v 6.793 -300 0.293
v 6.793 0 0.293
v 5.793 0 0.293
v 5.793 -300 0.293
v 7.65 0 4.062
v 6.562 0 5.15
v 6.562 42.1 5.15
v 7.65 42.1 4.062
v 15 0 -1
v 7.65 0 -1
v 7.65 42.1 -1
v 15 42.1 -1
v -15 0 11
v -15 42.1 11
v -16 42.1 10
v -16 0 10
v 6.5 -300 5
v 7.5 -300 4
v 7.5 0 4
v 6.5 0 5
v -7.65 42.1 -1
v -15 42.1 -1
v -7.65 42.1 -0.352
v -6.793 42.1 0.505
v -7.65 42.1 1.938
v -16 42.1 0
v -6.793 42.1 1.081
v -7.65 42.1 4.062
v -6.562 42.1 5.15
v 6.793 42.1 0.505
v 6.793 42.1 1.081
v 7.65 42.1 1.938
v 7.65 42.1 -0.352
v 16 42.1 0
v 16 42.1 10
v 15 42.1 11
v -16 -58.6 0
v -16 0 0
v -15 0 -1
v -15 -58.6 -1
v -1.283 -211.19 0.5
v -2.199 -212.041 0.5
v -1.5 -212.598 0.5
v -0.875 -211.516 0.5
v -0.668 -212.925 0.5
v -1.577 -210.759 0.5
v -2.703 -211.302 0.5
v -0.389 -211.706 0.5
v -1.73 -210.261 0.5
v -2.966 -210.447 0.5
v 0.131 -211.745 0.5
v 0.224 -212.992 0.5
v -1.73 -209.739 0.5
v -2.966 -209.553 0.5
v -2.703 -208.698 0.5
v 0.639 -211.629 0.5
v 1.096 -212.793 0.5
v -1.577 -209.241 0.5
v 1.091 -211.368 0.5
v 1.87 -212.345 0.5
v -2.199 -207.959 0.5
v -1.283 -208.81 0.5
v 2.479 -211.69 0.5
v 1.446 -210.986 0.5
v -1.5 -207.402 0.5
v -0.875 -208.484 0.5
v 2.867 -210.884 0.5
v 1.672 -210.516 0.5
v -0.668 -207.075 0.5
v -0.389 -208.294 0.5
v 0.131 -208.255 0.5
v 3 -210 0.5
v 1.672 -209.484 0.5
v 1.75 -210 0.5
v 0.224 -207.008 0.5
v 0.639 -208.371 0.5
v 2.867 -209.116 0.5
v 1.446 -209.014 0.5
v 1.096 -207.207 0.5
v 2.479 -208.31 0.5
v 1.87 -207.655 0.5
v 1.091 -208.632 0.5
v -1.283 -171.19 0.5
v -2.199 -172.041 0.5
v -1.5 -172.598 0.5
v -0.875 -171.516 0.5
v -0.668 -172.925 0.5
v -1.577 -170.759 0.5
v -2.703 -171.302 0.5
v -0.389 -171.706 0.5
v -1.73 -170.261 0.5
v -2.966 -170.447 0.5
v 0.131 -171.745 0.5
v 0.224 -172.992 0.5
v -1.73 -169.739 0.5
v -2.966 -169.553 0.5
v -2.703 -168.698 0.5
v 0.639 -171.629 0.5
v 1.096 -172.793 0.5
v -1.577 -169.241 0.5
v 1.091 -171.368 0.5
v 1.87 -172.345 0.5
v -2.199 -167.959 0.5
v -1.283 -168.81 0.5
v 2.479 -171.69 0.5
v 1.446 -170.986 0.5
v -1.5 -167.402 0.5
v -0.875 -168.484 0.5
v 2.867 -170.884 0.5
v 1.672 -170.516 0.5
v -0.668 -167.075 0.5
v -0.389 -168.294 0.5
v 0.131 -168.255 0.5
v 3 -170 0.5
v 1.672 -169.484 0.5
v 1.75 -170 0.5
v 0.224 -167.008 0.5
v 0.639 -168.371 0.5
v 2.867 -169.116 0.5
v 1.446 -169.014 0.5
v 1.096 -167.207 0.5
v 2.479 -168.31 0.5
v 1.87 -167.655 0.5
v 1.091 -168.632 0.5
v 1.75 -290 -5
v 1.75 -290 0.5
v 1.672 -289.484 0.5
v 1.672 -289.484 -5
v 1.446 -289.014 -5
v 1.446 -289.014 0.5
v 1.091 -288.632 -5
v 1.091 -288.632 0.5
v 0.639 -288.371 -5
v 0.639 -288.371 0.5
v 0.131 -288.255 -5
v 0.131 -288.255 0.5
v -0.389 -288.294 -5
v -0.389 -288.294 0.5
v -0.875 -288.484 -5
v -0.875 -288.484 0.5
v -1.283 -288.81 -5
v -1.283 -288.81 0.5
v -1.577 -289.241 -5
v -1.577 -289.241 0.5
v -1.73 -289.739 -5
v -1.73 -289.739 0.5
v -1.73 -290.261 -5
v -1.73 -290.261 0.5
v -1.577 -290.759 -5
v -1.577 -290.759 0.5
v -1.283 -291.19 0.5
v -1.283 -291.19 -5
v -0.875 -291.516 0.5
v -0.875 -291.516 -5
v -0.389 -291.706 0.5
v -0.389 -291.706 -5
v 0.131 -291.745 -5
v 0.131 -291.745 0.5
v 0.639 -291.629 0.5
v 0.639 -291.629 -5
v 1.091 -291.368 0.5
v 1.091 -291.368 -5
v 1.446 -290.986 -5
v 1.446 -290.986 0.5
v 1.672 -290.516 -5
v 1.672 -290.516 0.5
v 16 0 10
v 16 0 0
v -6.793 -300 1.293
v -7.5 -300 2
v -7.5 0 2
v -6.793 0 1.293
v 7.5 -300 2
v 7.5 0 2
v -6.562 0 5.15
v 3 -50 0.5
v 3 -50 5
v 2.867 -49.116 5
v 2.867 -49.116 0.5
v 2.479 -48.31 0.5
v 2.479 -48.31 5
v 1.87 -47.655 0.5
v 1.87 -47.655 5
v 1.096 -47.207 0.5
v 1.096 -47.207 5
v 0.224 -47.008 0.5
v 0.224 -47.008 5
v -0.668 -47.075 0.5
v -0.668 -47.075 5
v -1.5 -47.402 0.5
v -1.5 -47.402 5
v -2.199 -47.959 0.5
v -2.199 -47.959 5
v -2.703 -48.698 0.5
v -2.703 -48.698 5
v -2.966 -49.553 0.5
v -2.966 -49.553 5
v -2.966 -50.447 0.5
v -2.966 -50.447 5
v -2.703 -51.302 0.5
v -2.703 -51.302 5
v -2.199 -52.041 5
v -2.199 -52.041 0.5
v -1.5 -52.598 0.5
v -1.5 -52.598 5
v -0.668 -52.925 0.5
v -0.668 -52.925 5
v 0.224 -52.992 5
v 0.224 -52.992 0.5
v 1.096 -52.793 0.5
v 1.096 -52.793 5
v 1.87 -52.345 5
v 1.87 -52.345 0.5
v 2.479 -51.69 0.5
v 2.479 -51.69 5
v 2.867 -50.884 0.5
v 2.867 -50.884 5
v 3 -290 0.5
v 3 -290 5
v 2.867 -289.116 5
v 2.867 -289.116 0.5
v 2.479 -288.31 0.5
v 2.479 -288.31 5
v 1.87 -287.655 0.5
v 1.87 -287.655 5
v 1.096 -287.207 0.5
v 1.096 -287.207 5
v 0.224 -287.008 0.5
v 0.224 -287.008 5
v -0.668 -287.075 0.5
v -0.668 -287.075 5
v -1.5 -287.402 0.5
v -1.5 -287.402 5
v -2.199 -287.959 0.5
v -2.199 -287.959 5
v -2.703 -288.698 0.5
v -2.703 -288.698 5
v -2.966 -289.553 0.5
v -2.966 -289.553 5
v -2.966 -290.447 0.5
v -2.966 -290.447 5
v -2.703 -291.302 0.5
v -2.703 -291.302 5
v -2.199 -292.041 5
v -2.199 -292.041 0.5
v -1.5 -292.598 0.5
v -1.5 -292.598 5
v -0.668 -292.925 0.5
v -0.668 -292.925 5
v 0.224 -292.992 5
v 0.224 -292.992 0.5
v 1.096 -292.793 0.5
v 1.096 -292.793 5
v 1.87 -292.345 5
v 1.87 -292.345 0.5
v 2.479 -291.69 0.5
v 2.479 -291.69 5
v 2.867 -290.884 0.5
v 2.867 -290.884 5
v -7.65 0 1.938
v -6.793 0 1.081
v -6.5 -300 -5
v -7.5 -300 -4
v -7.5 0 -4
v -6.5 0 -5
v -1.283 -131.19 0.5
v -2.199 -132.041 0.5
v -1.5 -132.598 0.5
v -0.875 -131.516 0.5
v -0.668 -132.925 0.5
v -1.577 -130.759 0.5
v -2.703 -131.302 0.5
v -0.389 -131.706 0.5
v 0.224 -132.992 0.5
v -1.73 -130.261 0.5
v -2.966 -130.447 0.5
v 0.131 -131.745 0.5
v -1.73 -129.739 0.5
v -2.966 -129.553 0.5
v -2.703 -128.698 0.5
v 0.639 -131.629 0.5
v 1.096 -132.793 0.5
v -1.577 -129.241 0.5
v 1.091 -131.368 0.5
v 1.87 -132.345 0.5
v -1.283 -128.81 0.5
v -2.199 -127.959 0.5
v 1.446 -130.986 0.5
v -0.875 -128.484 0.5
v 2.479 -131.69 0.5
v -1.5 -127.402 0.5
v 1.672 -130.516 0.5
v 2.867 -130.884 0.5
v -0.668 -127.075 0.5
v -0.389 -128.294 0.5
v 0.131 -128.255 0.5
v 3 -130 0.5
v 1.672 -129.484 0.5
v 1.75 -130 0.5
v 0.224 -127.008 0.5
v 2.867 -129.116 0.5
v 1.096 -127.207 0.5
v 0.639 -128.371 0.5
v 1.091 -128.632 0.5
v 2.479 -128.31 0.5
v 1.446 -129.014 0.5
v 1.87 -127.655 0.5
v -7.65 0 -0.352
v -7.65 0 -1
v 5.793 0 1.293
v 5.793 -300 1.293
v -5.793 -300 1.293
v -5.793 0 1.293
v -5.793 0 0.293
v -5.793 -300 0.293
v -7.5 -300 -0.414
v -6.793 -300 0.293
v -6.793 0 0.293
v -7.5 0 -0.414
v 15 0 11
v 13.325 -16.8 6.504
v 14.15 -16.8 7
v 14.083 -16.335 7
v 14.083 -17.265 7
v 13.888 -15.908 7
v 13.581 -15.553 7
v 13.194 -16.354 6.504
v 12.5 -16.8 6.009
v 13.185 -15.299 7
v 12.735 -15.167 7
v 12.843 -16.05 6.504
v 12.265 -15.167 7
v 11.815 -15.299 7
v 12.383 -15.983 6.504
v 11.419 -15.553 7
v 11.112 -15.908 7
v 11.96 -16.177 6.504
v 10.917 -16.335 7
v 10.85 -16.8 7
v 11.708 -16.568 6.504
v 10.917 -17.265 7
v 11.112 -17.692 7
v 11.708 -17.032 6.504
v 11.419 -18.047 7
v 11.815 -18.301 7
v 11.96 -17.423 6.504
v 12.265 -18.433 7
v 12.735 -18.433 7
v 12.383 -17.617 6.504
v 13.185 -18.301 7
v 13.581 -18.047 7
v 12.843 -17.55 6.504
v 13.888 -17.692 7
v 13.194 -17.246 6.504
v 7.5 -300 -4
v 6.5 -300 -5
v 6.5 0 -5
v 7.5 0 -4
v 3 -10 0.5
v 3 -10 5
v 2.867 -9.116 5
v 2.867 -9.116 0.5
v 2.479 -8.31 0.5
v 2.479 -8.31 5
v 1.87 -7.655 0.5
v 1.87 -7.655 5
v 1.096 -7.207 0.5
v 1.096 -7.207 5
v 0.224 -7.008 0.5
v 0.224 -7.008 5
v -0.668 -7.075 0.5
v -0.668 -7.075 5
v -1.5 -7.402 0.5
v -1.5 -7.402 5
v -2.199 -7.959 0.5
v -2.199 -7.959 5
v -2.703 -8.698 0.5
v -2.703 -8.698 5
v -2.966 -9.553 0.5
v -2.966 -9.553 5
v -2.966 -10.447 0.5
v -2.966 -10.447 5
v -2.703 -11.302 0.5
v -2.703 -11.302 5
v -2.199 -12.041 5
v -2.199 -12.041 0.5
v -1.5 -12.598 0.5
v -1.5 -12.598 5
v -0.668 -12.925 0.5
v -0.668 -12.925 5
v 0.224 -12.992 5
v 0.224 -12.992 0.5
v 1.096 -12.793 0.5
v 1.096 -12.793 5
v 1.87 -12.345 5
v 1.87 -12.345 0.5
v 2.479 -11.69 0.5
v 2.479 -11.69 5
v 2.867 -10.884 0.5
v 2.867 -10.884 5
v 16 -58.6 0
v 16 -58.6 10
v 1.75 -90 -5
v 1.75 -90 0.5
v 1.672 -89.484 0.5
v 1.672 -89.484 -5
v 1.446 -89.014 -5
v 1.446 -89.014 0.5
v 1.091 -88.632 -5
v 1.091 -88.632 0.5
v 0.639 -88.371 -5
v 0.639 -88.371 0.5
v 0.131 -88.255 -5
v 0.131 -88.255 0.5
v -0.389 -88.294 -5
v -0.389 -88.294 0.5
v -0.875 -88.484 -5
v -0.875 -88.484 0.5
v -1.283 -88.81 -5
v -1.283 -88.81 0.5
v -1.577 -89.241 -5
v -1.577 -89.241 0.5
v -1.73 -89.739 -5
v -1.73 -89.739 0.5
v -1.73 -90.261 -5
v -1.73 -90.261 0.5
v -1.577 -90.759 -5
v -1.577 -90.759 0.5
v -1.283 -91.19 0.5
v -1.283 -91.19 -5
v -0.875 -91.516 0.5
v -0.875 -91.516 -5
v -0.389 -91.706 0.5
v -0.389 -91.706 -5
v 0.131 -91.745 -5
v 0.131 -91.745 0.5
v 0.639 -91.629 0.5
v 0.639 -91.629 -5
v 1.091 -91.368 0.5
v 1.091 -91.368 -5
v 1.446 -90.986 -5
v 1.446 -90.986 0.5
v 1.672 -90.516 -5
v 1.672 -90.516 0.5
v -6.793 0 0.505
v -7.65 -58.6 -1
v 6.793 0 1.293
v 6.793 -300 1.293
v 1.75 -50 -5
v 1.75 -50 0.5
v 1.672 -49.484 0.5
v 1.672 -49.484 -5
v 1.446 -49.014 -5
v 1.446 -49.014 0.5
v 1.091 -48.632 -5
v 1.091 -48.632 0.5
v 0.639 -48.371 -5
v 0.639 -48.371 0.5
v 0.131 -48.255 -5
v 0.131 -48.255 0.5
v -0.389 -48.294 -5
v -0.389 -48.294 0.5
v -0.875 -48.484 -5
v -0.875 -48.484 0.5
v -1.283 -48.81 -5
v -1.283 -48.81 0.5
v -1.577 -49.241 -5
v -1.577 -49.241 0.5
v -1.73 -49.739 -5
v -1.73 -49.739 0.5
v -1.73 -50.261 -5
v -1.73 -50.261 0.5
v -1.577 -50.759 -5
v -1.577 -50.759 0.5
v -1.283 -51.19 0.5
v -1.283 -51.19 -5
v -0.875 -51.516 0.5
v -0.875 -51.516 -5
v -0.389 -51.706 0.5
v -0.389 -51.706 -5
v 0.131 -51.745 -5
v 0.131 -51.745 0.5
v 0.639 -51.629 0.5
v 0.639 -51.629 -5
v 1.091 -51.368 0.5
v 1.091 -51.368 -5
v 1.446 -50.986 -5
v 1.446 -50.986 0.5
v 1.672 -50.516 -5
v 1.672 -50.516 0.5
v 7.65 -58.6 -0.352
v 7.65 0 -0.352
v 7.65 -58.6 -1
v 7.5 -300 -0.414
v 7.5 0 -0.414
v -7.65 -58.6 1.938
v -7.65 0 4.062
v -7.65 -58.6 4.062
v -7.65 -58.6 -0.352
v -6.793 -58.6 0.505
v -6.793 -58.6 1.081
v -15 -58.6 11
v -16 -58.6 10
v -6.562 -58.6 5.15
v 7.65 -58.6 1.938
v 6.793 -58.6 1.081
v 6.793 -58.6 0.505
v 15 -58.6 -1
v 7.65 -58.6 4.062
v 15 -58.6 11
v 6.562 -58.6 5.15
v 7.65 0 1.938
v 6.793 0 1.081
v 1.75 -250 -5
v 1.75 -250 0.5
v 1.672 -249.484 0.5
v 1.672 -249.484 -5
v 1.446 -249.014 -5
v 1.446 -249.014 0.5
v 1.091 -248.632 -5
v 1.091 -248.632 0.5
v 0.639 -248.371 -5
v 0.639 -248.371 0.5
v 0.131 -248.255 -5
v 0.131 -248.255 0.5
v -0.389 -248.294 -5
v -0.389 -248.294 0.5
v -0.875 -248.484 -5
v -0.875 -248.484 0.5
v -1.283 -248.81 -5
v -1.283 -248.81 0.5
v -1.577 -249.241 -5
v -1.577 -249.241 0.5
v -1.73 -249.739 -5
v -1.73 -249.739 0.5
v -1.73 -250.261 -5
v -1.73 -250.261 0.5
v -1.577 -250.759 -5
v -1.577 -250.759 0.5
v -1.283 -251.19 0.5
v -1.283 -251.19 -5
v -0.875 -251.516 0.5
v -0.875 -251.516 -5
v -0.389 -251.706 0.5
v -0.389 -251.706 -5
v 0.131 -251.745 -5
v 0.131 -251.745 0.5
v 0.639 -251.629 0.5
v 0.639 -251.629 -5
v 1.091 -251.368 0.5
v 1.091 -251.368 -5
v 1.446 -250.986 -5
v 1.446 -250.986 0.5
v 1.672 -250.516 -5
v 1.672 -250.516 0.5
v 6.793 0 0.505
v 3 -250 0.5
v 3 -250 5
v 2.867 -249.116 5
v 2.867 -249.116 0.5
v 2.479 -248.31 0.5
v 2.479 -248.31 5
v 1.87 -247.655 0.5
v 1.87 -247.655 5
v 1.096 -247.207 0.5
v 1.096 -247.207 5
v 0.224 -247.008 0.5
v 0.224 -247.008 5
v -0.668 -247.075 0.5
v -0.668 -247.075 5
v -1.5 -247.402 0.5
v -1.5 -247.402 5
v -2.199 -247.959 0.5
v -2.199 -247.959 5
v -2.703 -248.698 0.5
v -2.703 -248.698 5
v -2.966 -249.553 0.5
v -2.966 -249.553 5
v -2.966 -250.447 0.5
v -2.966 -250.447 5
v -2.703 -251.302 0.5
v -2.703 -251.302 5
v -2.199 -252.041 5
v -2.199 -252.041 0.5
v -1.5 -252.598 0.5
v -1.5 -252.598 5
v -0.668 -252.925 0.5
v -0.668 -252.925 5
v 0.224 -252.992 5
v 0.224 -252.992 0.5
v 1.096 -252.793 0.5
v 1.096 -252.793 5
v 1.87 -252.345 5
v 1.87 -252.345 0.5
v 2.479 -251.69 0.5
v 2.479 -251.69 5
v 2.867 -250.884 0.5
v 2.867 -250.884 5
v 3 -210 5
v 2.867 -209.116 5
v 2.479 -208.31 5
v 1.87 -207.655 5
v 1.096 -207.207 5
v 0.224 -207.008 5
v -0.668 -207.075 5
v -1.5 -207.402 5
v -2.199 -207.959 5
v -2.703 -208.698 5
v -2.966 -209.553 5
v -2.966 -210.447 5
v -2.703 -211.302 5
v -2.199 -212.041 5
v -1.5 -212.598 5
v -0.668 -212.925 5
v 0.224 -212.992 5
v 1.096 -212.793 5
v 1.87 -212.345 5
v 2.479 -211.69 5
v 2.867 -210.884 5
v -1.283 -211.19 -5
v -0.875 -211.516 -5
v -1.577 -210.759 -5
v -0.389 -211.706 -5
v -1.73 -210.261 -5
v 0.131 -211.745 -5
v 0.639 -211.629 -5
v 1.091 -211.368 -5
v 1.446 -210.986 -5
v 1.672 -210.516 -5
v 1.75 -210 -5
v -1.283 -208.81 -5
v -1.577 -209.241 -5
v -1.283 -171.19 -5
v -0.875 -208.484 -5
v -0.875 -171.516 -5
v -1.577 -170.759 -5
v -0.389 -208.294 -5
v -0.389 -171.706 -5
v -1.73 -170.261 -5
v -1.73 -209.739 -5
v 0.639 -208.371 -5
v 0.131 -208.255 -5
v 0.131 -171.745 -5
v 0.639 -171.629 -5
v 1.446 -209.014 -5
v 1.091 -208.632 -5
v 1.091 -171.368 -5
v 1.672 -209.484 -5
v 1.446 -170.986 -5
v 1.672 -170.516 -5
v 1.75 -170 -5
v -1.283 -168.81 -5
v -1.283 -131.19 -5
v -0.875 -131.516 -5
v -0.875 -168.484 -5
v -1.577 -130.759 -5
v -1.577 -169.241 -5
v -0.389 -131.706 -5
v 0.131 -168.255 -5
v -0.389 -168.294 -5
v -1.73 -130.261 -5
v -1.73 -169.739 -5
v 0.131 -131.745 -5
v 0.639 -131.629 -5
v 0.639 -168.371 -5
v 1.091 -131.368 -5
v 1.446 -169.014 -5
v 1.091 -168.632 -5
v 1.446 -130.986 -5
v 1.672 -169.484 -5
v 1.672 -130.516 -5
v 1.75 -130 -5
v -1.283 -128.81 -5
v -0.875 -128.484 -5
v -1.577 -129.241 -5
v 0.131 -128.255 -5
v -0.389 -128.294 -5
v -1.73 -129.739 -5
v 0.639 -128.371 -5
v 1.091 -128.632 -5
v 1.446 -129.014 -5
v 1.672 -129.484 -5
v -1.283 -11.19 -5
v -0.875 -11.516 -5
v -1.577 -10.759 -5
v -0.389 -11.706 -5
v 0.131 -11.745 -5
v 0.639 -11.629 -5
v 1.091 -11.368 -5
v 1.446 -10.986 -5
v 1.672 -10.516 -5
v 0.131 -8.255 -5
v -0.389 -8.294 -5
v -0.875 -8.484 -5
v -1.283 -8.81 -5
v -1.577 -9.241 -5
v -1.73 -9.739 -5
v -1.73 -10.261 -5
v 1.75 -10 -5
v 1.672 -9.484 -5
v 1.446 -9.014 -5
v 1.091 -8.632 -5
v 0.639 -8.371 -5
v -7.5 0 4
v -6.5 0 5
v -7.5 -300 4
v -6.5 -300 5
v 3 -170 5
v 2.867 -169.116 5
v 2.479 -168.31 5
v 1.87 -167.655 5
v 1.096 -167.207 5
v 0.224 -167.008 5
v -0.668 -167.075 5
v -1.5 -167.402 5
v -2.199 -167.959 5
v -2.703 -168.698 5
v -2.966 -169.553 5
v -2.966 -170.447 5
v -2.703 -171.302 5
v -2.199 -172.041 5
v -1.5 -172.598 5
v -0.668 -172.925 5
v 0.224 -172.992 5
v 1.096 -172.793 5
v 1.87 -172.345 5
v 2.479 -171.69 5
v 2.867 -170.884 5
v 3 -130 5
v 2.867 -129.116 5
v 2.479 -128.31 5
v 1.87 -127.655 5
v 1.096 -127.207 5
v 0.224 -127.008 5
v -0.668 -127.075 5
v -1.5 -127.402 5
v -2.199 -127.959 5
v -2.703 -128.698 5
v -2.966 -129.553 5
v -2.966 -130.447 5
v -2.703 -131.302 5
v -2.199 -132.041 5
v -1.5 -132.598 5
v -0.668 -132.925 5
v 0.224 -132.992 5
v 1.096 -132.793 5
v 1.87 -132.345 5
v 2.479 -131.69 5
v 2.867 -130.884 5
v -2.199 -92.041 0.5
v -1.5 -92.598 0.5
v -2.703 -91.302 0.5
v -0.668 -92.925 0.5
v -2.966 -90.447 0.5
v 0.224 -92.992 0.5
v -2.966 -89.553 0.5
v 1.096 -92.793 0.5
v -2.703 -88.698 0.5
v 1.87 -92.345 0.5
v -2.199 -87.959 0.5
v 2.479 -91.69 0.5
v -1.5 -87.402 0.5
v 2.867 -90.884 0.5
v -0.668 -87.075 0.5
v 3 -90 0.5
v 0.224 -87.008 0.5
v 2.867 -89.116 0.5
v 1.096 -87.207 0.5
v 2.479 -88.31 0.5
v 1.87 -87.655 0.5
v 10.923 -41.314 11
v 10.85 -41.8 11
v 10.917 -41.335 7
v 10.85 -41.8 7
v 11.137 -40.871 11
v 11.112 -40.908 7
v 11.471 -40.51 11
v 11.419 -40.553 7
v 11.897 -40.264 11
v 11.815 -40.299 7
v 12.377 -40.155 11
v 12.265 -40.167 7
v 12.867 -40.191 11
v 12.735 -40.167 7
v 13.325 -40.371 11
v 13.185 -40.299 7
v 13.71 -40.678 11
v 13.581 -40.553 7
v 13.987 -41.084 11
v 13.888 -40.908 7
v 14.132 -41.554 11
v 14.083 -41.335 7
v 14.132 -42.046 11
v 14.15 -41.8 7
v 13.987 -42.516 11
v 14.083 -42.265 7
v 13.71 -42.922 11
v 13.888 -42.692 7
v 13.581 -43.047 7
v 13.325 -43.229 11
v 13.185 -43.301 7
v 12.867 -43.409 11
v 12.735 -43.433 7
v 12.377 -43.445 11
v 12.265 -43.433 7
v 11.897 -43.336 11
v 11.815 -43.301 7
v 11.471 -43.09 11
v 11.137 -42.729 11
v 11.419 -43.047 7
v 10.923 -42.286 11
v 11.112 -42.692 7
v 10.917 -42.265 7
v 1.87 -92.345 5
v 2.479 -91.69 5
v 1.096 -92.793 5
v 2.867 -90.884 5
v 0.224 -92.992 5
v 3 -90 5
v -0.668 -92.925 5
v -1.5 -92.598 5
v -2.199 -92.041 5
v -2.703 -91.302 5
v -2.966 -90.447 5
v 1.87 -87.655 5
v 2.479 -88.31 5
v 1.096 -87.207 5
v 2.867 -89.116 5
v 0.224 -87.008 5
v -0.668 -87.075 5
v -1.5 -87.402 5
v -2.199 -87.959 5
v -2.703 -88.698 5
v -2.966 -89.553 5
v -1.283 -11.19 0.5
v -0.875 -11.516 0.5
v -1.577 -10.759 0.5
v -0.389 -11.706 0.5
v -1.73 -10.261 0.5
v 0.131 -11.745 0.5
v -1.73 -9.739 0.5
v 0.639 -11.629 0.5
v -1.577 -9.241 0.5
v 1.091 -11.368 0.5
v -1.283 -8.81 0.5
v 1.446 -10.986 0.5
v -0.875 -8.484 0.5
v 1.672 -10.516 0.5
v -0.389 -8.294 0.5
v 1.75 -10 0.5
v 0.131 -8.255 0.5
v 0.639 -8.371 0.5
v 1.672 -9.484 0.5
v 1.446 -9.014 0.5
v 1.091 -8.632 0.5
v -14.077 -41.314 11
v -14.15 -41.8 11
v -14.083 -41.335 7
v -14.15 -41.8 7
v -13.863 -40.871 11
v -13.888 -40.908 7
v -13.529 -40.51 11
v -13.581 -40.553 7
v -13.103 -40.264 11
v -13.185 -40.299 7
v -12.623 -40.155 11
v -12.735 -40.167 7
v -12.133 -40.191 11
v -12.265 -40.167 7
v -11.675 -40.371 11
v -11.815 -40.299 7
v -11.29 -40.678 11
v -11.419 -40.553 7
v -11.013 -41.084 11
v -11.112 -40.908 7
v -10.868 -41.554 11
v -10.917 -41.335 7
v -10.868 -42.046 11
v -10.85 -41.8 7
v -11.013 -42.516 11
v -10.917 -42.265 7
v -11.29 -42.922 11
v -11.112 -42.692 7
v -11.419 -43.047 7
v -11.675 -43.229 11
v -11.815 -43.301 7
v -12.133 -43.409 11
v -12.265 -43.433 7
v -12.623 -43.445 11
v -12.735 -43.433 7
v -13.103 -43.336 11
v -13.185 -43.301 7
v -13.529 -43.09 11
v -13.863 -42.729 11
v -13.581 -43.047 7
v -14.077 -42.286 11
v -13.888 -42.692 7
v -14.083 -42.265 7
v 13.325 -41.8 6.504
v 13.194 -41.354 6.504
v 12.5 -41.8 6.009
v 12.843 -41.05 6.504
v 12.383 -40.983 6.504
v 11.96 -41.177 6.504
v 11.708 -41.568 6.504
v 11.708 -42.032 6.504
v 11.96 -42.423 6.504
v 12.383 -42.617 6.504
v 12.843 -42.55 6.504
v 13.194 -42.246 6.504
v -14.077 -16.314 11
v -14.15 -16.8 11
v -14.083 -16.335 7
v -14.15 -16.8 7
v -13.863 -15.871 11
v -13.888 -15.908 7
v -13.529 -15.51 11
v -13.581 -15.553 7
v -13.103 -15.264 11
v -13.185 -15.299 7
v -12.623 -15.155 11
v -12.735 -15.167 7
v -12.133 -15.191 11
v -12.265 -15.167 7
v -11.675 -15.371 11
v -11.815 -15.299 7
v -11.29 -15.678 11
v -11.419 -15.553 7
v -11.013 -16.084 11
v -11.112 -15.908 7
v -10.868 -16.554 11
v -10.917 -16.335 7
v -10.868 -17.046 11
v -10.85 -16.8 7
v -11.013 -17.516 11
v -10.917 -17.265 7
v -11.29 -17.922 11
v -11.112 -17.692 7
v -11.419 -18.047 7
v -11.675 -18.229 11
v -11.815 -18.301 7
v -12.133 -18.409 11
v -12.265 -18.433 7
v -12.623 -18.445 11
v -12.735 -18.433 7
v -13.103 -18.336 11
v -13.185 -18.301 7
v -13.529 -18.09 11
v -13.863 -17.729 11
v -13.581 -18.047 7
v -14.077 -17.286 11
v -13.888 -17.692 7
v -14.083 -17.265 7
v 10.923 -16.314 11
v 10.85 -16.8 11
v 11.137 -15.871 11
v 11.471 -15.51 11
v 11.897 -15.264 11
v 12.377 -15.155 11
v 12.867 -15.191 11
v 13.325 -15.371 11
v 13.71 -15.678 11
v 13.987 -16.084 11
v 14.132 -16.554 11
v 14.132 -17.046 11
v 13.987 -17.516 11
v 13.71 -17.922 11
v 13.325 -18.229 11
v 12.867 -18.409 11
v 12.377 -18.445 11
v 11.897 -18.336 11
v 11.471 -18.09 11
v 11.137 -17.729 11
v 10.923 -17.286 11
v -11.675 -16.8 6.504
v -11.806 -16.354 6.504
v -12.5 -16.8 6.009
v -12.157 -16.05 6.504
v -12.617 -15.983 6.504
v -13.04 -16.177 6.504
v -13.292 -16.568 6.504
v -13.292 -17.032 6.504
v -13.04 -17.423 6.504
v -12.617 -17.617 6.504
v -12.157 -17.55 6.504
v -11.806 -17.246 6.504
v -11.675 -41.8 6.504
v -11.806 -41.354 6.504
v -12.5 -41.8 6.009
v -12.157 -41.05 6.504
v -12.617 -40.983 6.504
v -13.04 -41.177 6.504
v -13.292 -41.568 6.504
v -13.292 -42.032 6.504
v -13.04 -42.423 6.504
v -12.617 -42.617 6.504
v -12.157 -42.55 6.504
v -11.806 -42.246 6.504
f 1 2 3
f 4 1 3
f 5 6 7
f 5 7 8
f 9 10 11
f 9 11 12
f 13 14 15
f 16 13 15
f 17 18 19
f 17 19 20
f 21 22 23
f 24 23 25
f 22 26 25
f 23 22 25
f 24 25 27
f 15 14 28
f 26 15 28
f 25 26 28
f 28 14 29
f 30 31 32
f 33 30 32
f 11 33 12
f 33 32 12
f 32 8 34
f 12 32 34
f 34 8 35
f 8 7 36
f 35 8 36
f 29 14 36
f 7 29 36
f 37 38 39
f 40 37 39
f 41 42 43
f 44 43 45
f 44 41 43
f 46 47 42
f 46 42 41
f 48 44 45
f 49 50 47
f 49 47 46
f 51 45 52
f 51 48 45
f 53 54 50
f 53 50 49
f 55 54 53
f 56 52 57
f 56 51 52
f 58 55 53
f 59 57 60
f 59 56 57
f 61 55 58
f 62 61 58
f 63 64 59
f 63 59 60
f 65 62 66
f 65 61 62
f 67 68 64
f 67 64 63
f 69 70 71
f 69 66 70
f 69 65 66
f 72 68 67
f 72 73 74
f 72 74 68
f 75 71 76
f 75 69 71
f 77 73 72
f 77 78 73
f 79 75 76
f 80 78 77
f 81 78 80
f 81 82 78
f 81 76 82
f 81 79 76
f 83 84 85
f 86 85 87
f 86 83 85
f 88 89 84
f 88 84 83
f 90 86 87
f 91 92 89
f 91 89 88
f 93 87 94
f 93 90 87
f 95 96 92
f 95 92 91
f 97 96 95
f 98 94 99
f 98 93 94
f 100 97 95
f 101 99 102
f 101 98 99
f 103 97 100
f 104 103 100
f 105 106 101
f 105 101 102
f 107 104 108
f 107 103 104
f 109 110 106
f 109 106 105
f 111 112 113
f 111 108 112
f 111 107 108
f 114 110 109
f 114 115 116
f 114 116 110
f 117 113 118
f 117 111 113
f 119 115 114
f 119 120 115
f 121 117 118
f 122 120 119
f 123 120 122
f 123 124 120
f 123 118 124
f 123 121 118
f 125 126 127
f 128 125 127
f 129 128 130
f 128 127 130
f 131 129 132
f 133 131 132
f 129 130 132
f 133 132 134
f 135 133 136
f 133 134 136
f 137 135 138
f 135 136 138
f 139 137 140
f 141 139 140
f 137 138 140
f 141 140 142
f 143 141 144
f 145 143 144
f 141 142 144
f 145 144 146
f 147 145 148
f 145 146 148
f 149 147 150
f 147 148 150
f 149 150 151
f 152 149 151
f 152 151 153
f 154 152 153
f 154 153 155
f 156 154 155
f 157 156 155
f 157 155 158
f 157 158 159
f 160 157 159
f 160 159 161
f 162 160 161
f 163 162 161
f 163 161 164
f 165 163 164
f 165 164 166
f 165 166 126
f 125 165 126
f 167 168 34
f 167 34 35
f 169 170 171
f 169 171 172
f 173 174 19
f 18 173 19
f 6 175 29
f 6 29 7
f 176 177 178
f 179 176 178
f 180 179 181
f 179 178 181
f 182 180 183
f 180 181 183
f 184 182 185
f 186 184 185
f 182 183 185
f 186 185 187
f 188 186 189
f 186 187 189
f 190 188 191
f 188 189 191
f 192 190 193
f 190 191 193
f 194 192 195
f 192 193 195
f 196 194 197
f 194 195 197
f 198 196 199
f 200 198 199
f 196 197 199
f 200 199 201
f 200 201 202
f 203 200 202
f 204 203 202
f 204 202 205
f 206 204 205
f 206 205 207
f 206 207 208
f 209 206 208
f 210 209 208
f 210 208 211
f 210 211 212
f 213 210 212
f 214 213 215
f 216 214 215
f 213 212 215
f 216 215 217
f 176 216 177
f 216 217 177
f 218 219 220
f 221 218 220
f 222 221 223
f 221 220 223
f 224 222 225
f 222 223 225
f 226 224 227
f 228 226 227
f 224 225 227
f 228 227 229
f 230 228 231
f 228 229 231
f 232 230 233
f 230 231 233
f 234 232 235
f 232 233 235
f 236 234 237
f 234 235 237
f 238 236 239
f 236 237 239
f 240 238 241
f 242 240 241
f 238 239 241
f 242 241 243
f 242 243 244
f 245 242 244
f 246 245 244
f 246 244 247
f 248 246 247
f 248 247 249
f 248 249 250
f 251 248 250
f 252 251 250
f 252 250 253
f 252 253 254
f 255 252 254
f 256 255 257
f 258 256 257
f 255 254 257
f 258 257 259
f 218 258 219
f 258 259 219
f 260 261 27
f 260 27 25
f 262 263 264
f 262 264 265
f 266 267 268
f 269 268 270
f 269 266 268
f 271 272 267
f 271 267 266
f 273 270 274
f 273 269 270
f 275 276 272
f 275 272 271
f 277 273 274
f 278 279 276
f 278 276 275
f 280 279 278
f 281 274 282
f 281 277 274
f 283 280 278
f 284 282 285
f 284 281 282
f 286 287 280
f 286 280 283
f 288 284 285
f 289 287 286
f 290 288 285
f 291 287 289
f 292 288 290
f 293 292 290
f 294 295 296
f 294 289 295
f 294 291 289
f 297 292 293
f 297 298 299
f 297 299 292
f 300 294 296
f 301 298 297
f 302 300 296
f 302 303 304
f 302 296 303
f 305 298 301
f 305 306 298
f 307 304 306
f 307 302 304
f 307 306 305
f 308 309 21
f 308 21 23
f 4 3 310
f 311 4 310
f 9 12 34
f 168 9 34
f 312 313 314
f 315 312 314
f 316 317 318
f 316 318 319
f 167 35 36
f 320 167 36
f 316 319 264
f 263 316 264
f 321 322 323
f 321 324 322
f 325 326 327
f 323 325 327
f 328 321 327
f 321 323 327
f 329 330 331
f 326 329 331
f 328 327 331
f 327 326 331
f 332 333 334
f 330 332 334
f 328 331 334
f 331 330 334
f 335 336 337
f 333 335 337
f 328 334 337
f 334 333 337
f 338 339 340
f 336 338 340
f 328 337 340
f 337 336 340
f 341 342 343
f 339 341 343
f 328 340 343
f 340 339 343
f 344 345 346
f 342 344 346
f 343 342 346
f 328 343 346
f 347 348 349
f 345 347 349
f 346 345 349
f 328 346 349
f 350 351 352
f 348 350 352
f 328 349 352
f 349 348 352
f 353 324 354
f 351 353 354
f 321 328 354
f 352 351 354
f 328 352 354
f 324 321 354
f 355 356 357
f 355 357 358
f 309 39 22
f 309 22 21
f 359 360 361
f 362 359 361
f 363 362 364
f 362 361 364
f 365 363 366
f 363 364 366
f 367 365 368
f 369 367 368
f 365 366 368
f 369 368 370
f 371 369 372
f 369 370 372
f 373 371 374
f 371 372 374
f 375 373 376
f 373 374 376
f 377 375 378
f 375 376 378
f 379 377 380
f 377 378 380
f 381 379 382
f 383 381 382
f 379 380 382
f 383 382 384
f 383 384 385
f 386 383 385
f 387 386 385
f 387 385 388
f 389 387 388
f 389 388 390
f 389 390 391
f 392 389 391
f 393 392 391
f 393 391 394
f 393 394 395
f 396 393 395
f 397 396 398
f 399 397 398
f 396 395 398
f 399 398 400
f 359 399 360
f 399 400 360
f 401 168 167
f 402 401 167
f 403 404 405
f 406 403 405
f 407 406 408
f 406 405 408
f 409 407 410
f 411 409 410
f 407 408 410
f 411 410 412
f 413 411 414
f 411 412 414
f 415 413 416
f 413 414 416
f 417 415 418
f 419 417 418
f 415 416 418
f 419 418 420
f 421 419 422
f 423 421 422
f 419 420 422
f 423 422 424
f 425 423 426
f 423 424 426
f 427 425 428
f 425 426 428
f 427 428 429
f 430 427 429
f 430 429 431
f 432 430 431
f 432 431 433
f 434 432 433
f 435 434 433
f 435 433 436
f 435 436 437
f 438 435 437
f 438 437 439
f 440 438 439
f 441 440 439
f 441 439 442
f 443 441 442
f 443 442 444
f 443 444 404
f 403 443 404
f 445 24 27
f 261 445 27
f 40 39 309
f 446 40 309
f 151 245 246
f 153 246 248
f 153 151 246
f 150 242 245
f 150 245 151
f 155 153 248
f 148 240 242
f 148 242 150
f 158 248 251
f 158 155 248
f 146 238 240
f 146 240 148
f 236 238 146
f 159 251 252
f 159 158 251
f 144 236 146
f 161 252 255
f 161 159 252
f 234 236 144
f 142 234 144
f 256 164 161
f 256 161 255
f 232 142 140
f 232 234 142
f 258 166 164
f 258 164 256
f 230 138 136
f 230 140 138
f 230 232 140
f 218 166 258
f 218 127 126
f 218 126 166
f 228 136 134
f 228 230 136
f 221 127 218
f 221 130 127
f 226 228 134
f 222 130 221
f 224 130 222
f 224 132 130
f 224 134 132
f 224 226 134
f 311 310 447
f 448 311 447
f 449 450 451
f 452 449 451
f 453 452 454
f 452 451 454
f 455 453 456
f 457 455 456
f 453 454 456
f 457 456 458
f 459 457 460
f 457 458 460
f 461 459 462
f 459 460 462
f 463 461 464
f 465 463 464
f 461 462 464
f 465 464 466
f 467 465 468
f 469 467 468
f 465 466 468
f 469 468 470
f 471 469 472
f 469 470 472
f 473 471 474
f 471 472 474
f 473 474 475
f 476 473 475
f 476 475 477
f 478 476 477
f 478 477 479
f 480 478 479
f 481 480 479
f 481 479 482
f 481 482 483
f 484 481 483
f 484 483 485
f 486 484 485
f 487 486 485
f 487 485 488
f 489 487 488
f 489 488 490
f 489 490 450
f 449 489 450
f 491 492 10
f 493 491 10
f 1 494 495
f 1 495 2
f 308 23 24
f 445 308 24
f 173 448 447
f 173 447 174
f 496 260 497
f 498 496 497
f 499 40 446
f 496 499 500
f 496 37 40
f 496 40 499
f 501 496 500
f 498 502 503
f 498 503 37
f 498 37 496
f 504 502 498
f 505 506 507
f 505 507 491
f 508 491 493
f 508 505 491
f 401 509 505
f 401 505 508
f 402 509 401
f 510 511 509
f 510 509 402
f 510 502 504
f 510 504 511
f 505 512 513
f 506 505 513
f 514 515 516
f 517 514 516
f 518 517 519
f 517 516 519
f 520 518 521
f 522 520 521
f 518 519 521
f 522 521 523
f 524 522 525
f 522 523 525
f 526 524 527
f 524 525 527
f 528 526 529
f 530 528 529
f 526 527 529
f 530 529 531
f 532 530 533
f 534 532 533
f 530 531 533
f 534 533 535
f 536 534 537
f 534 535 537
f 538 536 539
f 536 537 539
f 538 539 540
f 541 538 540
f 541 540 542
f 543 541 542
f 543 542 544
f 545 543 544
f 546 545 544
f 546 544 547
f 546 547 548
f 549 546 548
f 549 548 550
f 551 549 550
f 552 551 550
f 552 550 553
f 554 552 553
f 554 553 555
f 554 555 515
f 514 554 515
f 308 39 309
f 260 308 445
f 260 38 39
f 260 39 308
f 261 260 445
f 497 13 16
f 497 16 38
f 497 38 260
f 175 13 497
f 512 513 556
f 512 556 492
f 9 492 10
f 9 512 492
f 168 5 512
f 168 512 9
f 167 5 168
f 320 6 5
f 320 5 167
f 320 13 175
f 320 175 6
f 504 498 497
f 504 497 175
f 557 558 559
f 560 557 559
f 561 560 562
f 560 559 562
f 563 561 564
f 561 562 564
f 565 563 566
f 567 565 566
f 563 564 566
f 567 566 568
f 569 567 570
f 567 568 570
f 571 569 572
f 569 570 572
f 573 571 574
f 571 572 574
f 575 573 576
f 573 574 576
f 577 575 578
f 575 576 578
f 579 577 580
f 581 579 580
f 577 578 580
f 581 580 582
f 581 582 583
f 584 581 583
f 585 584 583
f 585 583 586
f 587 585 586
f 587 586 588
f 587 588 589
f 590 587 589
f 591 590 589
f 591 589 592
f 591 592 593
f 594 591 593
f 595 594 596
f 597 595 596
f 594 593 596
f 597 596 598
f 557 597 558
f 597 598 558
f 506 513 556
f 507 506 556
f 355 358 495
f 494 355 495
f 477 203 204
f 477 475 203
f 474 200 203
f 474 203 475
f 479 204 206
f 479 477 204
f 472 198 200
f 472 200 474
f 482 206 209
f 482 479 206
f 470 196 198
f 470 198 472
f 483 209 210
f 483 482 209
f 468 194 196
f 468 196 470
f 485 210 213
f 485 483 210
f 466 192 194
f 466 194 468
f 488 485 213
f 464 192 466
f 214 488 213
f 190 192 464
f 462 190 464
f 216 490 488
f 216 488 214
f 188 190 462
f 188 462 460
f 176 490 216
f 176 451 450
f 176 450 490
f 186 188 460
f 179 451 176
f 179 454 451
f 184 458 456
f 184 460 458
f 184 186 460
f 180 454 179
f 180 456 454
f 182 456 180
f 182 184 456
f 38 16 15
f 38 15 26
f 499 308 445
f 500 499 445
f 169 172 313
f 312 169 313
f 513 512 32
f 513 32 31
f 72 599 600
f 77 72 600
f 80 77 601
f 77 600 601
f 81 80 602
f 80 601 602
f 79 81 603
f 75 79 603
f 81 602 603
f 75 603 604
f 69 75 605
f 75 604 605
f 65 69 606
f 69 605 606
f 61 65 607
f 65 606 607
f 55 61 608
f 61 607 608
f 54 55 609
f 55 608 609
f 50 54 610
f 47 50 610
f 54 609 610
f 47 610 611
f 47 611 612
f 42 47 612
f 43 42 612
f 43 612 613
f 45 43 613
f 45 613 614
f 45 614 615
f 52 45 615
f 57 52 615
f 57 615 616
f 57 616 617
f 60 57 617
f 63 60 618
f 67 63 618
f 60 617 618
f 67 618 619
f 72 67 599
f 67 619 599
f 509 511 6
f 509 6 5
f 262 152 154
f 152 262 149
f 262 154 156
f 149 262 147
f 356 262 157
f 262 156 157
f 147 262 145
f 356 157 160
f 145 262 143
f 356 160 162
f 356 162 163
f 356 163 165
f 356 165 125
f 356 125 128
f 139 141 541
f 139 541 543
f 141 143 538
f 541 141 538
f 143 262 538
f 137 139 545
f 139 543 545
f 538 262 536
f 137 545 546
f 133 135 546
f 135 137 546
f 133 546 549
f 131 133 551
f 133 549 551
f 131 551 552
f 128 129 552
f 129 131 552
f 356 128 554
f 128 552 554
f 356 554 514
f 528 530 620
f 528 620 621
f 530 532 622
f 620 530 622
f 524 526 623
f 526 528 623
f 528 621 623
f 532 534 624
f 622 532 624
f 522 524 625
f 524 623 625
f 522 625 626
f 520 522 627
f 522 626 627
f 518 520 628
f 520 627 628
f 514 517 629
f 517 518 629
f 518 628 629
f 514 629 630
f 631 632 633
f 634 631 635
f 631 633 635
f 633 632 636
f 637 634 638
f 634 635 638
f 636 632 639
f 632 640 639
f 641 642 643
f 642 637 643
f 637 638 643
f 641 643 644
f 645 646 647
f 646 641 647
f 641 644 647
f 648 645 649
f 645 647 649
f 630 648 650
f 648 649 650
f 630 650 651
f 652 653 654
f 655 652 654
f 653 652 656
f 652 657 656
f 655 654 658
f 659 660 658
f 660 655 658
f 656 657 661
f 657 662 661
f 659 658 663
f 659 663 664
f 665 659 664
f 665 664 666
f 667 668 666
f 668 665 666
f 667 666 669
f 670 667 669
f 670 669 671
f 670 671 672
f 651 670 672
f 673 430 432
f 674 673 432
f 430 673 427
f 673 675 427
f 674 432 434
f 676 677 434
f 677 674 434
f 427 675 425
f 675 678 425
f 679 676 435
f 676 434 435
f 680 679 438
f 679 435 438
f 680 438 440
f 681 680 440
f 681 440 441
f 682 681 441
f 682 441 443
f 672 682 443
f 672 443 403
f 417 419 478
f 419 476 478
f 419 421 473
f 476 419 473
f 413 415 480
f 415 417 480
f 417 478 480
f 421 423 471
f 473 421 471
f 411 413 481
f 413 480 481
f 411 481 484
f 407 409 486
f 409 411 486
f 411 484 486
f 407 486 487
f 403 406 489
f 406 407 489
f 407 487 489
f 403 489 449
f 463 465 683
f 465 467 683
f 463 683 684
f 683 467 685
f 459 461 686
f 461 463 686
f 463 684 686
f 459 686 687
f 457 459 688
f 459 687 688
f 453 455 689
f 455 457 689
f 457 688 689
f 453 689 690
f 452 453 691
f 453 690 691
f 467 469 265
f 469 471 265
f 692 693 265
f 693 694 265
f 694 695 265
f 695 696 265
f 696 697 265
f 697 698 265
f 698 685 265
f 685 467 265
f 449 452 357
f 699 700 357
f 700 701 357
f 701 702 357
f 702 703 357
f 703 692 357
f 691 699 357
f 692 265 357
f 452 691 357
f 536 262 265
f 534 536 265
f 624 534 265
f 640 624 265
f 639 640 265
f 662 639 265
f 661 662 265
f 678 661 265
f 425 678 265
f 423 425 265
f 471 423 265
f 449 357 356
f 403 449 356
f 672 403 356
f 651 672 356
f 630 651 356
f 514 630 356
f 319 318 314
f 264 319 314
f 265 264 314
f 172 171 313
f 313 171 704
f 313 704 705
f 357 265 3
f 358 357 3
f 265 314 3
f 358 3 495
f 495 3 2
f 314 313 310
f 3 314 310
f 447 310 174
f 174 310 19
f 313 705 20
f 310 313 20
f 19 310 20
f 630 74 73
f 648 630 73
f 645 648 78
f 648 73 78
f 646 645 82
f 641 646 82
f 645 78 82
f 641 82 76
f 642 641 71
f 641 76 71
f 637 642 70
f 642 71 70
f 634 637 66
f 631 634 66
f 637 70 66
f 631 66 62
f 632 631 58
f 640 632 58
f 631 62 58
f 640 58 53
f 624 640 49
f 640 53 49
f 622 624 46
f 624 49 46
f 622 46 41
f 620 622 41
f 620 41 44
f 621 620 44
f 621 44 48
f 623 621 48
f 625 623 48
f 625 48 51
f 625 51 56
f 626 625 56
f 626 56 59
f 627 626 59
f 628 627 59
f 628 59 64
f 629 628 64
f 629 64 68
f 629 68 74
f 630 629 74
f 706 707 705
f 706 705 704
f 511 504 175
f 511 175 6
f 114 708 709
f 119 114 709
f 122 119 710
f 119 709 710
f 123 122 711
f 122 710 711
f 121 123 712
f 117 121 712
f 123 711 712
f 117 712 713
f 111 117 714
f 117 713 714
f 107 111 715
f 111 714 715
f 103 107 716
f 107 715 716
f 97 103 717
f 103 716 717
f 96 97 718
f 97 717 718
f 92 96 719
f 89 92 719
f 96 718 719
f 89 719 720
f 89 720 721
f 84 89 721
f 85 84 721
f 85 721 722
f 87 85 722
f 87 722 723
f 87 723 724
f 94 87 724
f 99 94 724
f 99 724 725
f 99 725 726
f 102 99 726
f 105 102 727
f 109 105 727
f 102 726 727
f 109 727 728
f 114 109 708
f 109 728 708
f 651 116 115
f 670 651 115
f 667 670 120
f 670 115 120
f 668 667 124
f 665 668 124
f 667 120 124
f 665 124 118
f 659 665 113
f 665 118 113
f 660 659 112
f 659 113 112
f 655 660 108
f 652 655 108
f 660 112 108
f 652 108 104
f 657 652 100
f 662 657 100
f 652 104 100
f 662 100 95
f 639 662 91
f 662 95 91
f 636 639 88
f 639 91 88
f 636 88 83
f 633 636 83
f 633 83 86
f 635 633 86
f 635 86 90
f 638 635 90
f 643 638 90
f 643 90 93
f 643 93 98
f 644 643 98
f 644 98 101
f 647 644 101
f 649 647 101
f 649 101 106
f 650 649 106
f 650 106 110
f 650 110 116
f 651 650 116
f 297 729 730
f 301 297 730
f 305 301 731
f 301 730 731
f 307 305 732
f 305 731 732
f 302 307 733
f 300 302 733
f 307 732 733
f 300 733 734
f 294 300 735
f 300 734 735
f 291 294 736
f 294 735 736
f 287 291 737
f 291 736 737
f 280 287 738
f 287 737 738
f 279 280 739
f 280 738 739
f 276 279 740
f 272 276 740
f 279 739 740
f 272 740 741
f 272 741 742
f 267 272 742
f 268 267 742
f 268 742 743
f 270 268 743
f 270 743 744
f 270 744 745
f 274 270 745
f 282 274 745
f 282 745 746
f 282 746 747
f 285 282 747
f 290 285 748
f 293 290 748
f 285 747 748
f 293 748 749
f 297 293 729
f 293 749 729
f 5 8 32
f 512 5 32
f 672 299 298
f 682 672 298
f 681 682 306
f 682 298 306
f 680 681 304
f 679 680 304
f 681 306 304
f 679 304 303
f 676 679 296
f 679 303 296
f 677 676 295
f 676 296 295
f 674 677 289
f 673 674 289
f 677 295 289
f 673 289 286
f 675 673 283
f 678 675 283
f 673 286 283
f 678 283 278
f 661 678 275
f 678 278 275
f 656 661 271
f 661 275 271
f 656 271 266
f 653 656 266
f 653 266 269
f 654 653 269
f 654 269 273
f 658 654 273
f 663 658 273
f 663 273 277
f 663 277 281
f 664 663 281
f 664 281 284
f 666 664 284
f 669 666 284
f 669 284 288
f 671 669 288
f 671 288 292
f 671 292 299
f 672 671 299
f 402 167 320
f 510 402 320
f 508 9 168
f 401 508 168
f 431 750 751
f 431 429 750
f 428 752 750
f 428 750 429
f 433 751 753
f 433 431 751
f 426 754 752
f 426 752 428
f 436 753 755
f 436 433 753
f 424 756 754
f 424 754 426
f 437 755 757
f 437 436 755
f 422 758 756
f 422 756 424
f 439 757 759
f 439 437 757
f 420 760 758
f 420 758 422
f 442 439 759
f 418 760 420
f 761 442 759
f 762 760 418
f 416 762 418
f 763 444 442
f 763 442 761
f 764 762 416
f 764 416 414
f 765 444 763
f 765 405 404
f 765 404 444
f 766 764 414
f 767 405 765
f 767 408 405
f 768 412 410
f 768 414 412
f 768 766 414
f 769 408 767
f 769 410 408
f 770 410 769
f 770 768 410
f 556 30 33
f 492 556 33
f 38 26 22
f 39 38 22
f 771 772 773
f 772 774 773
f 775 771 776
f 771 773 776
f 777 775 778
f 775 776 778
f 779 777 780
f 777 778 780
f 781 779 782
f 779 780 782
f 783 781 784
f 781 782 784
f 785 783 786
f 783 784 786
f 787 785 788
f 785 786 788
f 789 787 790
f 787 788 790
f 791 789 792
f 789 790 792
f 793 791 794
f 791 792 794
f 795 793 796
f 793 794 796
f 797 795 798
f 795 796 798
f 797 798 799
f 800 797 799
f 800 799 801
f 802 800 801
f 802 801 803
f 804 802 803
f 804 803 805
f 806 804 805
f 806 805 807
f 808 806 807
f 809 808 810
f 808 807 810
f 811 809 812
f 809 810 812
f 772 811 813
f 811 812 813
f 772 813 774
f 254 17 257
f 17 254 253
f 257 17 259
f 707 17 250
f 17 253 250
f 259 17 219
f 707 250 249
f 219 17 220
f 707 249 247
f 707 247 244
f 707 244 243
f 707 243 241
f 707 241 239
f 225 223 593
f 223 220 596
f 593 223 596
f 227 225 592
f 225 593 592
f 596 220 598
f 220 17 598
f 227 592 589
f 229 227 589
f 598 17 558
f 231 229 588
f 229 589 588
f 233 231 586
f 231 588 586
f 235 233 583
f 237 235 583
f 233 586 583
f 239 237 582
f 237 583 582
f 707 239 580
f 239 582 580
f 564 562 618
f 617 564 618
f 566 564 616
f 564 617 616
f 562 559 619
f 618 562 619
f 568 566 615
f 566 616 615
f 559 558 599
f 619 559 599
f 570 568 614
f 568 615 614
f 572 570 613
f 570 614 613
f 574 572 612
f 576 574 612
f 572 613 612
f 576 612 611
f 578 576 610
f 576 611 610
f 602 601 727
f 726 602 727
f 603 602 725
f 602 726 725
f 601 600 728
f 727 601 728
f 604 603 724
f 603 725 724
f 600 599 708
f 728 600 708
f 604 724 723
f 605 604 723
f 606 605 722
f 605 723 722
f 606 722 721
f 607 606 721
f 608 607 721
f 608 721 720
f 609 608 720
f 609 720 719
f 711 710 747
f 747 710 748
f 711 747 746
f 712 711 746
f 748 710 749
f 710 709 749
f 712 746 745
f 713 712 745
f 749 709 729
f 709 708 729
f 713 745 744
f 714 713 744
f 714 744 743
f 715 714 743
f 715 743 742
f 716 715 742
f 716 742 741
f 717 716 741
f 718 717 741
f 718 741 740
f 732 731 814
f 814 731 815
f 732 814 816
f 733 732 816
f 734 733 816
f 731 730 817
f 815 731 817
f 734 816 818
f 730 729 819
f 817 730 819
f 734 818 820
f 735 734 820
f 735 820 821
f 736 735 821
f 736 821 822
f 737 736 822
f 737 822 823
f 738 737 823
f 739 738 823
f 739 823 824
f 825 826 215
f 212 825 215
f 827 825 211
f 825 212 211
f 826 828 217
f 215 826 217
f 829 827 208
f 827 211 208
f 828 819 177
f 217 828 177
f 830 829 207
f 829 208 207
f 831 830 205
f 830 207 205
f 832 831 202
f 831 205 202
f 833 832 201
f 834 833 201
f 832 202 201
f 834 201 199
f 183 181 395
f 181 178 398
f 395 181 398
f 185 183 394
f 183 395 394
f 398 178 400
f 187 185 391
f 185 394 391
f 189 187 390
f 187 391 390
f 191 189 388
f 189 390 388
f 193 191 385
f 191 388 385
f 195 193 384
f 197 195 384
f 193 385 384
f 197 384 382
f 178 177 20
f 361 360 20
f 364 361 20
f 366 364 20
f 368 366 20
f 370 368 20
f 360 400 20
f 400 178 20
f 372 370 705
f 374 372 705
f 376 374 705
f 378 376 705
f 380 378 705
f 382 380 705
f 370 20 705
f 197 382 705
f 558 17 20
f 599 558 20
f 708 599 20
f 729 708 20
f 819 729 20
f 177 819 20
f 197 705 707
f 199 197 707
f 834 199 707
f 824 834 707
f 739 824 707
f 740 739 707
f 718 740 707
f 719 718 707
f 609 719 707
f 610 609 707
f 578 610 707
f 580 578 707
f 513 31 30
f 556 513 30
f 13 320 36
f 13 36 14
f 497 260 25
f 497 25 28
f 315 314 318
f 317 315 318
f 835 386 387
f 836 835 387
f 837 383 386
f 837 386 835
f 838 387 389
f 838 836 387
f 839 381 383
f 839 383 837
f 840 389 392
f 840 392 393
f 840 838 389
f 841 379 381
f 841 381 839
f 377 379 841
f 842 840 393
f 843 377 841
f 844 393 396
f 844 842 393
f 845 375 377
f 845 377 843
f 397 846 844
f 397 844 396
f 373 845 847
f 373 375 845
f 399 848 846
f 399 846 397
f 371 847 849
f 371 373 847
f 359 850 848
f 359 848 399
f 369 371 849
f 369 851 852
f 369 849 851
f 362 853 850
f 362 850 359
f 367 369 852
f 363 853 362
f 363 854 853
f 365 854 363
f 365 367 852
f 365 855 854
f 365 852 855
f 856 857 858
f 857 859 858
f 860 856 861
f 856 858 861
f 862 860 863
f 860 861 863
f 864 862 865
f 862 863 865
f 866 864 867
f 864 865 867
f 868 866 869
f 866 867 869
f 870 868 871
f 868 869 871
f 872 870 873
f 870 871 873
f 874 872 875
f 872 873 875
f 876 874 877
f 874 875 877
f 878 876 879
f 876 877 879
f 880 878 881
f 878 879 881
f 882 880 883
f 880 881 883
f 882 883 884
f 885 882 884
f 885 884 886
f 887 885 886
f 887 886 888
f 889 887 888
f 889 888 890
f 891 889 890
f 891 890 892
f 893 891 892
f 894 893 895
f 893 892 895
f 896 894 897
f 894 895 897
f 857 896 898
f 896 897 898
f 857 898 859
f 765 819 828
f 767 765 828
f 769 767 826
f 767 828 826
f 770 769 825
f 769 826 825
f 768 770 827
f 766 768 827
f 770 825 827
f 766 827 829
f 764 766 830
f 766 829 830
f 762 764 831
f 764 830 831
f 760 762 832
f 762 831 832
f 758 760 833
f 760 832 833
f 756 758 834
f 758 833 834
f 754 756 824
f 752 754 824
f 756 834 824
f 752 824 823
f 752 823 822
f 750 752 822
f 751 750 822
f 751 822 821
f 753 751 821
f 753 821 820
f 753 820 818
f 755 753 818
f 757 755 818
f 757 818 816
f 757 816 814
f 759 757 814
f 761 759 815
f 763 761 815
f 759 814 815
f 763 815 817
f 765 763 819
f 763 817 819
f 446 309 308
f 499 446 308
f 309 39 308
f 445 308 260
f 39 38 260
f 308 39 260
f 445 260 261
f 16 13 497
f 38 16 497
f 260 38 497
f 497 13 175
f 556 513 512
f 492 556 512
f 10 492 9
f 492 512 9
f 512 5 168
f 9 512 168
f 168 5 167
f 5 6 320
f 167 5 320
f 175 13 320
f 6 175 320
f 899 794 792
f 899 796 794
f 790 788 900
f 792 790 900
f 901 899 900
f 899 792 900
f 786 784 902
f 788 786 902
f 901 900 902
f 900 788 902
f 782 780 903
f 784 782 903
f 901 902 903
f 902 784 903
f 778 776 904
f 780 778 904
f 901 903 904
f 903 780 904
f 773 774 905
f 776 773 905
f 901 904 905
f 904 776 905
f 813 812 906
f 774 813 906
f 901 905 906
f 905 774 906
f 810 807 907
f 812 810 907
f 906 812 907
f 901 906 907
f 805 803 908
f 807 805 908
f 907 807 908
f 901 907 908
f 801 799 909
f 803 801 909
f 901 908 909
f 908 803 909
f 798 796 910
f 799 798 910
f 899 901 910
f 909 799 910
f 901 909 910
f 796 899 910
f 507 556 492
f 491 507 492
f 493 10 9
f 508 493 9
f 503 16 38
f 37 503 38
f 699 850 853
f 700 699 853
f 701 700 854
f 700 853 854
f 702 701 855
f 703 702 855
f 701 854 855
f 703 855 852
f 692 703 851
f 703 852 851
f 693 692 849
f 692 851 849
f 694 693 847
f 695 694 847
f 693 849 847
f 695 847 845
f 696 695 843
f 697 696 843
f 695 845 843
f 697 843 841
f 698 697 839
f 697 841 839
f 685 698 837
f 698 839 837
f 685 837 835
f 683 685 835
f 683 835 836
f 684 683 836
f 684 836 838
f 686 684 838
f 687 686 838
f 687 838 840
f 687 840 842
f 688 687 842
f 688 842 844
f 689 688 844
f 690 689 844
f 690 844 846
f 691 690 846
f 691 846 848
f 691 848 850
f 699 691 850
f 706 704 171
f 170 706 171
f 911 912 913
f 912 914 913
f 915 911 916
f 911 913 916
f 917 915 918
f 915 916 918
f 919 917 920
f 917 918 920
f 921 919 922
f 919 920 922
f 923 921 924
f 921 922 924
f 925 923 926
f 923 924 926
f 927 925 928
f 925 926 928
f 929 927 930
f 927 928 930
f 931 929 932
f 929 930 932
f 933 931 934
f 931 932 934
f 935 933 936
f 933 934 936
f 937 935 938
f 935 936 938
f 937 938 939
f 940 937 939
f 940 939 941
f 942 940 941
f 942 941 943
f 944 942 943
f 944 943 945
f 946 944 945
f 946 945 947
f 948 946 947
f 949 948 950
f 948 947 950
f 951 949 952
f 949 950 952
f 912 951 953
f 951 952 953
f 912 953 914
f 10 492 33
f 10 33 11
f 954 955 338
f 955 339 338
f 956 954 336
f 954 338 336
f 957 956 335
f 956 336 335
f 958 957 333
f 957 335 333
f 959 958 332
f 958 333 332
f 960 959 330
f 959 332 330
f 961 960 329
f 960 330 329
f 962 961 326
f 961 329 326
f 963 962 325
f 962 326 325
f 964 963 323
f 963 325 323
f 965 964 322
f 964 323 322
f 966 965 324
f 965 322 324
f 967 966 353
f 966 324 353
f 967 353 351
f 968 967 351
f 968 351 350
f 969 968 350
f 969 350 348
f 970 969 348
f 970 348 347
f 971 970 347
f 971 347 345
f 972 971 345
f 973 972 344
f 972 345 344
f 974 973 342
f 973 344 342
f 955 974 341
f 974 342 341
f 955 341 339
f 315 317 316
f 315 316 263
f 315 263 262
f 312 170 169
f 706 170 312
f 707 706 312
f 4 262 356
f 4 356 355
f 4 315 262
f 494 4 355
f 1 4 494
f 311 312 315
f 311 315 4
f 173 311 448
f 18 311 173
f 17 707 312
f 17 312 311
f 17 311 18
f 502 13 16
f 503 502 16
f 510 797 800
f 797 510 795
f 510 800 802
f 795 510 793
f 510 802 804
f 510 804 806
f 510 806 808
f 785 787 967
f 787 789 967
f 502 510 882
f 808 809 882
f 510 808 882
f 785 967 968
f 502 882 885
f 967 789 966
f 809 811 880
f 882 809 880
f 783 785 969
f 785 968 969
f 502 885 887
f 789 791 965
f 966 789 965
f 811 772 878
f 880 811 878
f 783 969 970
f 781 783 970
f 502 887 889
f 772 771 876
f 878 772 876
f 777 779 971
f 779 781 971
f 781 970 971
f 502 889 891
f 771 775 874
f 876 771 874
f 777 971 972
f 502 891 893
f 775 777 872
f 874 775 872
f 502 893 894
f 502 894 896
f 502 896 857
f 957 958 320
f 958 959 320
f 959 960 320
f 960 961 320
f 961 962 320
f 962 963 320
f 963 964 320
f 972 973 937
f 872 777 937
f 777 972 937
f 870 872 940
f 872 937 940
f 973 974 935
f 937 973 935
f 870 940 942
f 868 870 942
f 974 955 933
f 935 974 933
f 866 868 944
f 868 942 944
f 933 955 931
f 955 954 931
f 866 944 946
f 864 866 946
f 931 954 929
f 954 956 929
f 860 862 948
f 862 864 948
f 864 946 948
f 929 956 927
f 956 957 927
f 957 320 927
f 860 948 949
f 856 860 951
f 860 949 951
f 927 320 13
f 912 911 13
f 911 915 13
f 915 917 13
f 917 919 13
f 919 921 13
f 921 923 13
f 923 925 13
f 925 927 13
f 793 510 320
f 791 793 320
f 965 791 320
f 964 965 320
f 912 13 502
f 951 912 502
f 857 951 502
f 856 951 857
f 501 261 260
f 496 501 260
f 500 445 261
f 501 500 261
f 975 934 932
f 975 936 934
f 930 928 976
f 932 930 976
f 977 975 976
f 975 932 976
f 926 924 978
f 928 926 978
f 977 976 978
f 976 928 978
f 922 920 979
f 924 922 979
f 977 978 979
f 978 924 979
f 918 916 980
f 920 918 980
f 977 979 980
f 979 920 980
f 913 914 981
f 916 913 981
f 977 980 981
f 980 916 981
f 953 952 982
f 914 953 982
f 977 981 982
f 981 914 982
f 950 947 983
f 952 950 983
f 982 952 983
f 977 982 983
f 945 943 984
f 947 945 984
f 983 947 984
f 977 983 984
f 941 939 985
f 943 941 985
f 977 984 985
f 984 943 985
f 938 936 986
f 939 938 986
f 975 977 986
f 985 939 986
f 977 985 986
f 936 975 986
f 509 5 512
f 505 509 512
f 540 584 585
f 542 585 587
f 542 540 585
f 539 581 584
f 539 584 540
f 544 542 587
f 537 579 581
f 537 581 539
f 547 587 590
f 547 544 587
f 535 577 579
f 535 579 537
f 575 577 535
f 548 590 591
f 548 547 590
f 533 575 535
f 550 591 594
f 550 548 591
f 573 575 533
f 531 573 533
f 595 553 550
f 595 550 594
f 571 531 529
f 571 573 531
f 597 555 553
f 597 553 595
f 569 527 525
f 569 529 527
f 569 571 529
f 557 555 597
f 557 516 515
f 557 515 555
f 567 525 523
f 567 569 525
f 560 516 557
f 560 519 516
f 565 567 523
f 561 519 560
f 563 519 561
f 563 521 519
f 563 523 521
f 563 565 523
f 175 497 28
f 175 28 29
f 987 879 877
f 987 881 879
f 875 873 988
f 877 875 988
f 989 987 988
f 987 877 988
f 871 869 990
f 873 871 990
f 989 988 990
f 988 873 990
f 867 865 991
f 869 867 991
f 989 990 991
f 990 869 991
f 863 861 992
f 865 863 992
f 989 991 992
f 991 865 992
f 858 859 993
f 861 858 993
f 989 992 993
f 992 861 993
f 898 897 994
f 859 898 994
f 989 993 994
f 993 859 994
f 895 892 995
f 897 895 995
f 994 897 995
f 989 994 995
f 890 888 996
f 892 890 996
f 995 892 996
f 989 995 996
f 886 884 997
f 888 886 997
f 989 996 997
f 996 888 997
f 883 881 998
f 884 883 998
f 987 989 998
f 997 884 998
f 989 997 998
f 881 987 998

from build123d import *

# Parameters (mm, degrees)
F1_DEPTH  = 300
F2_R      = 1.75
F3_DEPTH  = 10.001
F4_R      = 3
F5_DEPTH  = 4.5
F7_DEPTH  = 58.6
F8_DEPTH  = 42.1
F10_D     = 3.3
F10_DEPTH = 4
F10_TIP   = 0.9914200214


with BuildPart() as f1:
    # F0 (on Front) → F1 (new body)
    with BuildSketch(Plane.XZ):
        Polygon((-6.5, -5), (6.5, -5), (7.5, -4), (7.5, -0.4142135624), (6.7928932188, 0.2928932188), (5.7928932188, 0.2928932188), (5.7928932188, 1.2928932188), (6.7928932188, 1.2928932188), (7.5, 2), (7.5, 4), (6.5, 5), (-6.5, 5), (-7.5, 4), (-7.5, 2), (-6.7928932188, 1.2928932188), (-5.7928932188, 1.2928932188), (-5.7928932188, 0.2928932188), (-6.7928932188, 0.2928932188), (-7.5, -0.4142135624), (-7.5, -4), align=None)
    extrude(amount=F1_DEPTH)

    # F2 (on face) → F3 (cut, through all)
    with BuildSketch(Plane.XY.offset(5)):
        with Locations((0, -10)):
            Circle(F2_R)
        with Locations((0, -50)):
            Circle(F2_R)
        with Locations((0, -90)):
            Circle(F2_R)
        with Locations((0, -130)):
            Circle(F2_R)
        with Locations((0, -170)):
            Circle(F2_R)
        with Locations((0, -210)):
            Circle(F2_R)
        with Locations((0, -250)):
            Circle(F2_R)
        with Locations((0, -290)):
            Circle(F2_R)
        with Locations((0, -330)):
            Circle(F2_R)
    extrude(amount=-F3_DEPTH, mode=Mode.SUBTRACT)

    # F4 (on face) → F5 (cut)
    with BuildSketch(Plane.XY.offset(5)):
        with Locations((0, -10)):
            Circle(F4_R)
        with Locations((0, -50)):
            Circle(F4_R)
        with Locations((0, -90)):
            Circle(F4_R)
        with Locations((0, -130)):
            Circle(F4_R)
        with Locations((0, -170)):
            Circle(F4_R)
        with Locations((0, -210)):
            Circle(F4_R)
        with Locations((0, -250)):
            Circle(F4_R)
        with Locations((0, -290)):
            Circle(F4_R)
        with Locations((0, -330)):
            Circle(F4_R)
    extrude(amount=-F5_DEPTH, mode=Mode.SUBTRACT)


with BuildPart() as f7:
    # F6 (on Front) → F7 (new body)
    with BuildSketch(Plane.XZ):
        Polygon((-15, -1), (-7.65, -1), (-7.65, -0.352081528), (-6.7928932188, 0.5050252532), (-6.7928932188, 1.0807611845), (-7.65, 1.9378679656), (-7.65, 4.0621320344), (-6.5621320344, 5.15), (0, 5.15), (6.5621320344, 5.15), (7.65, 4.0621320344), (7.65, 1.9378679656), (6.7928932188, 1.0807611845), (6.7928932188, 0.5050252532), (7.65, -0.352081528), (7.65, -1), (15, -1), (16, 0), (16, 10), (15, 11), (0, 11), (-15, 11), (-16, 10), (-16, 0), align=None)
    extrude(amount=F7_DEPTH)

    # F10
    with Locations(Plane.XY.offset(11)):
        with Locations((-12.5, -16.8), (12.5, -16.8), (-12.5, -41.8), (12.5, -41.8)):
            Hole(F10_D / 2, depth=F10_DEPTH)
            with Locations((0, 0, -(F10_DEPTH + F10_TIP / 2))):  # 118° drill point
                Cone(0, F10_D / 2, F10_TIP, mode=Mode.SUBTRACT)


with BuildPart() as f8:
    # F6 (on Front) → F8 (new body)
    with BuildSketch(Plane.XZ):
        Polygon((-15, -1), (-7.65, -1), (-7.65, -0.352081528), (-6.7928932188, 0.5050252532), (-6.7928932188, 1.0807611845), (-7.65, 1.9378679656), (-7.65, 4.0621320344), (-6.5621320344, 5.15), (0, 5.15), (6.5621320344, 5.15), (7.65, 4.0621320344), (7.65, 1.9378679656), (6.7928932188, 1.0807611845), (6.7928932188, 0.5050252532), (7.65, -0.352081528), (7.65, -1), (15, -1), (16, 0), (16, 10), (15, 11), (0, 11), (-15, 11), (-16, 10), (-16, 0), align=None)
    extrude(amount=-F8_DEPTH)


solid = Compound([f1.part, f7.part, f8.part])
